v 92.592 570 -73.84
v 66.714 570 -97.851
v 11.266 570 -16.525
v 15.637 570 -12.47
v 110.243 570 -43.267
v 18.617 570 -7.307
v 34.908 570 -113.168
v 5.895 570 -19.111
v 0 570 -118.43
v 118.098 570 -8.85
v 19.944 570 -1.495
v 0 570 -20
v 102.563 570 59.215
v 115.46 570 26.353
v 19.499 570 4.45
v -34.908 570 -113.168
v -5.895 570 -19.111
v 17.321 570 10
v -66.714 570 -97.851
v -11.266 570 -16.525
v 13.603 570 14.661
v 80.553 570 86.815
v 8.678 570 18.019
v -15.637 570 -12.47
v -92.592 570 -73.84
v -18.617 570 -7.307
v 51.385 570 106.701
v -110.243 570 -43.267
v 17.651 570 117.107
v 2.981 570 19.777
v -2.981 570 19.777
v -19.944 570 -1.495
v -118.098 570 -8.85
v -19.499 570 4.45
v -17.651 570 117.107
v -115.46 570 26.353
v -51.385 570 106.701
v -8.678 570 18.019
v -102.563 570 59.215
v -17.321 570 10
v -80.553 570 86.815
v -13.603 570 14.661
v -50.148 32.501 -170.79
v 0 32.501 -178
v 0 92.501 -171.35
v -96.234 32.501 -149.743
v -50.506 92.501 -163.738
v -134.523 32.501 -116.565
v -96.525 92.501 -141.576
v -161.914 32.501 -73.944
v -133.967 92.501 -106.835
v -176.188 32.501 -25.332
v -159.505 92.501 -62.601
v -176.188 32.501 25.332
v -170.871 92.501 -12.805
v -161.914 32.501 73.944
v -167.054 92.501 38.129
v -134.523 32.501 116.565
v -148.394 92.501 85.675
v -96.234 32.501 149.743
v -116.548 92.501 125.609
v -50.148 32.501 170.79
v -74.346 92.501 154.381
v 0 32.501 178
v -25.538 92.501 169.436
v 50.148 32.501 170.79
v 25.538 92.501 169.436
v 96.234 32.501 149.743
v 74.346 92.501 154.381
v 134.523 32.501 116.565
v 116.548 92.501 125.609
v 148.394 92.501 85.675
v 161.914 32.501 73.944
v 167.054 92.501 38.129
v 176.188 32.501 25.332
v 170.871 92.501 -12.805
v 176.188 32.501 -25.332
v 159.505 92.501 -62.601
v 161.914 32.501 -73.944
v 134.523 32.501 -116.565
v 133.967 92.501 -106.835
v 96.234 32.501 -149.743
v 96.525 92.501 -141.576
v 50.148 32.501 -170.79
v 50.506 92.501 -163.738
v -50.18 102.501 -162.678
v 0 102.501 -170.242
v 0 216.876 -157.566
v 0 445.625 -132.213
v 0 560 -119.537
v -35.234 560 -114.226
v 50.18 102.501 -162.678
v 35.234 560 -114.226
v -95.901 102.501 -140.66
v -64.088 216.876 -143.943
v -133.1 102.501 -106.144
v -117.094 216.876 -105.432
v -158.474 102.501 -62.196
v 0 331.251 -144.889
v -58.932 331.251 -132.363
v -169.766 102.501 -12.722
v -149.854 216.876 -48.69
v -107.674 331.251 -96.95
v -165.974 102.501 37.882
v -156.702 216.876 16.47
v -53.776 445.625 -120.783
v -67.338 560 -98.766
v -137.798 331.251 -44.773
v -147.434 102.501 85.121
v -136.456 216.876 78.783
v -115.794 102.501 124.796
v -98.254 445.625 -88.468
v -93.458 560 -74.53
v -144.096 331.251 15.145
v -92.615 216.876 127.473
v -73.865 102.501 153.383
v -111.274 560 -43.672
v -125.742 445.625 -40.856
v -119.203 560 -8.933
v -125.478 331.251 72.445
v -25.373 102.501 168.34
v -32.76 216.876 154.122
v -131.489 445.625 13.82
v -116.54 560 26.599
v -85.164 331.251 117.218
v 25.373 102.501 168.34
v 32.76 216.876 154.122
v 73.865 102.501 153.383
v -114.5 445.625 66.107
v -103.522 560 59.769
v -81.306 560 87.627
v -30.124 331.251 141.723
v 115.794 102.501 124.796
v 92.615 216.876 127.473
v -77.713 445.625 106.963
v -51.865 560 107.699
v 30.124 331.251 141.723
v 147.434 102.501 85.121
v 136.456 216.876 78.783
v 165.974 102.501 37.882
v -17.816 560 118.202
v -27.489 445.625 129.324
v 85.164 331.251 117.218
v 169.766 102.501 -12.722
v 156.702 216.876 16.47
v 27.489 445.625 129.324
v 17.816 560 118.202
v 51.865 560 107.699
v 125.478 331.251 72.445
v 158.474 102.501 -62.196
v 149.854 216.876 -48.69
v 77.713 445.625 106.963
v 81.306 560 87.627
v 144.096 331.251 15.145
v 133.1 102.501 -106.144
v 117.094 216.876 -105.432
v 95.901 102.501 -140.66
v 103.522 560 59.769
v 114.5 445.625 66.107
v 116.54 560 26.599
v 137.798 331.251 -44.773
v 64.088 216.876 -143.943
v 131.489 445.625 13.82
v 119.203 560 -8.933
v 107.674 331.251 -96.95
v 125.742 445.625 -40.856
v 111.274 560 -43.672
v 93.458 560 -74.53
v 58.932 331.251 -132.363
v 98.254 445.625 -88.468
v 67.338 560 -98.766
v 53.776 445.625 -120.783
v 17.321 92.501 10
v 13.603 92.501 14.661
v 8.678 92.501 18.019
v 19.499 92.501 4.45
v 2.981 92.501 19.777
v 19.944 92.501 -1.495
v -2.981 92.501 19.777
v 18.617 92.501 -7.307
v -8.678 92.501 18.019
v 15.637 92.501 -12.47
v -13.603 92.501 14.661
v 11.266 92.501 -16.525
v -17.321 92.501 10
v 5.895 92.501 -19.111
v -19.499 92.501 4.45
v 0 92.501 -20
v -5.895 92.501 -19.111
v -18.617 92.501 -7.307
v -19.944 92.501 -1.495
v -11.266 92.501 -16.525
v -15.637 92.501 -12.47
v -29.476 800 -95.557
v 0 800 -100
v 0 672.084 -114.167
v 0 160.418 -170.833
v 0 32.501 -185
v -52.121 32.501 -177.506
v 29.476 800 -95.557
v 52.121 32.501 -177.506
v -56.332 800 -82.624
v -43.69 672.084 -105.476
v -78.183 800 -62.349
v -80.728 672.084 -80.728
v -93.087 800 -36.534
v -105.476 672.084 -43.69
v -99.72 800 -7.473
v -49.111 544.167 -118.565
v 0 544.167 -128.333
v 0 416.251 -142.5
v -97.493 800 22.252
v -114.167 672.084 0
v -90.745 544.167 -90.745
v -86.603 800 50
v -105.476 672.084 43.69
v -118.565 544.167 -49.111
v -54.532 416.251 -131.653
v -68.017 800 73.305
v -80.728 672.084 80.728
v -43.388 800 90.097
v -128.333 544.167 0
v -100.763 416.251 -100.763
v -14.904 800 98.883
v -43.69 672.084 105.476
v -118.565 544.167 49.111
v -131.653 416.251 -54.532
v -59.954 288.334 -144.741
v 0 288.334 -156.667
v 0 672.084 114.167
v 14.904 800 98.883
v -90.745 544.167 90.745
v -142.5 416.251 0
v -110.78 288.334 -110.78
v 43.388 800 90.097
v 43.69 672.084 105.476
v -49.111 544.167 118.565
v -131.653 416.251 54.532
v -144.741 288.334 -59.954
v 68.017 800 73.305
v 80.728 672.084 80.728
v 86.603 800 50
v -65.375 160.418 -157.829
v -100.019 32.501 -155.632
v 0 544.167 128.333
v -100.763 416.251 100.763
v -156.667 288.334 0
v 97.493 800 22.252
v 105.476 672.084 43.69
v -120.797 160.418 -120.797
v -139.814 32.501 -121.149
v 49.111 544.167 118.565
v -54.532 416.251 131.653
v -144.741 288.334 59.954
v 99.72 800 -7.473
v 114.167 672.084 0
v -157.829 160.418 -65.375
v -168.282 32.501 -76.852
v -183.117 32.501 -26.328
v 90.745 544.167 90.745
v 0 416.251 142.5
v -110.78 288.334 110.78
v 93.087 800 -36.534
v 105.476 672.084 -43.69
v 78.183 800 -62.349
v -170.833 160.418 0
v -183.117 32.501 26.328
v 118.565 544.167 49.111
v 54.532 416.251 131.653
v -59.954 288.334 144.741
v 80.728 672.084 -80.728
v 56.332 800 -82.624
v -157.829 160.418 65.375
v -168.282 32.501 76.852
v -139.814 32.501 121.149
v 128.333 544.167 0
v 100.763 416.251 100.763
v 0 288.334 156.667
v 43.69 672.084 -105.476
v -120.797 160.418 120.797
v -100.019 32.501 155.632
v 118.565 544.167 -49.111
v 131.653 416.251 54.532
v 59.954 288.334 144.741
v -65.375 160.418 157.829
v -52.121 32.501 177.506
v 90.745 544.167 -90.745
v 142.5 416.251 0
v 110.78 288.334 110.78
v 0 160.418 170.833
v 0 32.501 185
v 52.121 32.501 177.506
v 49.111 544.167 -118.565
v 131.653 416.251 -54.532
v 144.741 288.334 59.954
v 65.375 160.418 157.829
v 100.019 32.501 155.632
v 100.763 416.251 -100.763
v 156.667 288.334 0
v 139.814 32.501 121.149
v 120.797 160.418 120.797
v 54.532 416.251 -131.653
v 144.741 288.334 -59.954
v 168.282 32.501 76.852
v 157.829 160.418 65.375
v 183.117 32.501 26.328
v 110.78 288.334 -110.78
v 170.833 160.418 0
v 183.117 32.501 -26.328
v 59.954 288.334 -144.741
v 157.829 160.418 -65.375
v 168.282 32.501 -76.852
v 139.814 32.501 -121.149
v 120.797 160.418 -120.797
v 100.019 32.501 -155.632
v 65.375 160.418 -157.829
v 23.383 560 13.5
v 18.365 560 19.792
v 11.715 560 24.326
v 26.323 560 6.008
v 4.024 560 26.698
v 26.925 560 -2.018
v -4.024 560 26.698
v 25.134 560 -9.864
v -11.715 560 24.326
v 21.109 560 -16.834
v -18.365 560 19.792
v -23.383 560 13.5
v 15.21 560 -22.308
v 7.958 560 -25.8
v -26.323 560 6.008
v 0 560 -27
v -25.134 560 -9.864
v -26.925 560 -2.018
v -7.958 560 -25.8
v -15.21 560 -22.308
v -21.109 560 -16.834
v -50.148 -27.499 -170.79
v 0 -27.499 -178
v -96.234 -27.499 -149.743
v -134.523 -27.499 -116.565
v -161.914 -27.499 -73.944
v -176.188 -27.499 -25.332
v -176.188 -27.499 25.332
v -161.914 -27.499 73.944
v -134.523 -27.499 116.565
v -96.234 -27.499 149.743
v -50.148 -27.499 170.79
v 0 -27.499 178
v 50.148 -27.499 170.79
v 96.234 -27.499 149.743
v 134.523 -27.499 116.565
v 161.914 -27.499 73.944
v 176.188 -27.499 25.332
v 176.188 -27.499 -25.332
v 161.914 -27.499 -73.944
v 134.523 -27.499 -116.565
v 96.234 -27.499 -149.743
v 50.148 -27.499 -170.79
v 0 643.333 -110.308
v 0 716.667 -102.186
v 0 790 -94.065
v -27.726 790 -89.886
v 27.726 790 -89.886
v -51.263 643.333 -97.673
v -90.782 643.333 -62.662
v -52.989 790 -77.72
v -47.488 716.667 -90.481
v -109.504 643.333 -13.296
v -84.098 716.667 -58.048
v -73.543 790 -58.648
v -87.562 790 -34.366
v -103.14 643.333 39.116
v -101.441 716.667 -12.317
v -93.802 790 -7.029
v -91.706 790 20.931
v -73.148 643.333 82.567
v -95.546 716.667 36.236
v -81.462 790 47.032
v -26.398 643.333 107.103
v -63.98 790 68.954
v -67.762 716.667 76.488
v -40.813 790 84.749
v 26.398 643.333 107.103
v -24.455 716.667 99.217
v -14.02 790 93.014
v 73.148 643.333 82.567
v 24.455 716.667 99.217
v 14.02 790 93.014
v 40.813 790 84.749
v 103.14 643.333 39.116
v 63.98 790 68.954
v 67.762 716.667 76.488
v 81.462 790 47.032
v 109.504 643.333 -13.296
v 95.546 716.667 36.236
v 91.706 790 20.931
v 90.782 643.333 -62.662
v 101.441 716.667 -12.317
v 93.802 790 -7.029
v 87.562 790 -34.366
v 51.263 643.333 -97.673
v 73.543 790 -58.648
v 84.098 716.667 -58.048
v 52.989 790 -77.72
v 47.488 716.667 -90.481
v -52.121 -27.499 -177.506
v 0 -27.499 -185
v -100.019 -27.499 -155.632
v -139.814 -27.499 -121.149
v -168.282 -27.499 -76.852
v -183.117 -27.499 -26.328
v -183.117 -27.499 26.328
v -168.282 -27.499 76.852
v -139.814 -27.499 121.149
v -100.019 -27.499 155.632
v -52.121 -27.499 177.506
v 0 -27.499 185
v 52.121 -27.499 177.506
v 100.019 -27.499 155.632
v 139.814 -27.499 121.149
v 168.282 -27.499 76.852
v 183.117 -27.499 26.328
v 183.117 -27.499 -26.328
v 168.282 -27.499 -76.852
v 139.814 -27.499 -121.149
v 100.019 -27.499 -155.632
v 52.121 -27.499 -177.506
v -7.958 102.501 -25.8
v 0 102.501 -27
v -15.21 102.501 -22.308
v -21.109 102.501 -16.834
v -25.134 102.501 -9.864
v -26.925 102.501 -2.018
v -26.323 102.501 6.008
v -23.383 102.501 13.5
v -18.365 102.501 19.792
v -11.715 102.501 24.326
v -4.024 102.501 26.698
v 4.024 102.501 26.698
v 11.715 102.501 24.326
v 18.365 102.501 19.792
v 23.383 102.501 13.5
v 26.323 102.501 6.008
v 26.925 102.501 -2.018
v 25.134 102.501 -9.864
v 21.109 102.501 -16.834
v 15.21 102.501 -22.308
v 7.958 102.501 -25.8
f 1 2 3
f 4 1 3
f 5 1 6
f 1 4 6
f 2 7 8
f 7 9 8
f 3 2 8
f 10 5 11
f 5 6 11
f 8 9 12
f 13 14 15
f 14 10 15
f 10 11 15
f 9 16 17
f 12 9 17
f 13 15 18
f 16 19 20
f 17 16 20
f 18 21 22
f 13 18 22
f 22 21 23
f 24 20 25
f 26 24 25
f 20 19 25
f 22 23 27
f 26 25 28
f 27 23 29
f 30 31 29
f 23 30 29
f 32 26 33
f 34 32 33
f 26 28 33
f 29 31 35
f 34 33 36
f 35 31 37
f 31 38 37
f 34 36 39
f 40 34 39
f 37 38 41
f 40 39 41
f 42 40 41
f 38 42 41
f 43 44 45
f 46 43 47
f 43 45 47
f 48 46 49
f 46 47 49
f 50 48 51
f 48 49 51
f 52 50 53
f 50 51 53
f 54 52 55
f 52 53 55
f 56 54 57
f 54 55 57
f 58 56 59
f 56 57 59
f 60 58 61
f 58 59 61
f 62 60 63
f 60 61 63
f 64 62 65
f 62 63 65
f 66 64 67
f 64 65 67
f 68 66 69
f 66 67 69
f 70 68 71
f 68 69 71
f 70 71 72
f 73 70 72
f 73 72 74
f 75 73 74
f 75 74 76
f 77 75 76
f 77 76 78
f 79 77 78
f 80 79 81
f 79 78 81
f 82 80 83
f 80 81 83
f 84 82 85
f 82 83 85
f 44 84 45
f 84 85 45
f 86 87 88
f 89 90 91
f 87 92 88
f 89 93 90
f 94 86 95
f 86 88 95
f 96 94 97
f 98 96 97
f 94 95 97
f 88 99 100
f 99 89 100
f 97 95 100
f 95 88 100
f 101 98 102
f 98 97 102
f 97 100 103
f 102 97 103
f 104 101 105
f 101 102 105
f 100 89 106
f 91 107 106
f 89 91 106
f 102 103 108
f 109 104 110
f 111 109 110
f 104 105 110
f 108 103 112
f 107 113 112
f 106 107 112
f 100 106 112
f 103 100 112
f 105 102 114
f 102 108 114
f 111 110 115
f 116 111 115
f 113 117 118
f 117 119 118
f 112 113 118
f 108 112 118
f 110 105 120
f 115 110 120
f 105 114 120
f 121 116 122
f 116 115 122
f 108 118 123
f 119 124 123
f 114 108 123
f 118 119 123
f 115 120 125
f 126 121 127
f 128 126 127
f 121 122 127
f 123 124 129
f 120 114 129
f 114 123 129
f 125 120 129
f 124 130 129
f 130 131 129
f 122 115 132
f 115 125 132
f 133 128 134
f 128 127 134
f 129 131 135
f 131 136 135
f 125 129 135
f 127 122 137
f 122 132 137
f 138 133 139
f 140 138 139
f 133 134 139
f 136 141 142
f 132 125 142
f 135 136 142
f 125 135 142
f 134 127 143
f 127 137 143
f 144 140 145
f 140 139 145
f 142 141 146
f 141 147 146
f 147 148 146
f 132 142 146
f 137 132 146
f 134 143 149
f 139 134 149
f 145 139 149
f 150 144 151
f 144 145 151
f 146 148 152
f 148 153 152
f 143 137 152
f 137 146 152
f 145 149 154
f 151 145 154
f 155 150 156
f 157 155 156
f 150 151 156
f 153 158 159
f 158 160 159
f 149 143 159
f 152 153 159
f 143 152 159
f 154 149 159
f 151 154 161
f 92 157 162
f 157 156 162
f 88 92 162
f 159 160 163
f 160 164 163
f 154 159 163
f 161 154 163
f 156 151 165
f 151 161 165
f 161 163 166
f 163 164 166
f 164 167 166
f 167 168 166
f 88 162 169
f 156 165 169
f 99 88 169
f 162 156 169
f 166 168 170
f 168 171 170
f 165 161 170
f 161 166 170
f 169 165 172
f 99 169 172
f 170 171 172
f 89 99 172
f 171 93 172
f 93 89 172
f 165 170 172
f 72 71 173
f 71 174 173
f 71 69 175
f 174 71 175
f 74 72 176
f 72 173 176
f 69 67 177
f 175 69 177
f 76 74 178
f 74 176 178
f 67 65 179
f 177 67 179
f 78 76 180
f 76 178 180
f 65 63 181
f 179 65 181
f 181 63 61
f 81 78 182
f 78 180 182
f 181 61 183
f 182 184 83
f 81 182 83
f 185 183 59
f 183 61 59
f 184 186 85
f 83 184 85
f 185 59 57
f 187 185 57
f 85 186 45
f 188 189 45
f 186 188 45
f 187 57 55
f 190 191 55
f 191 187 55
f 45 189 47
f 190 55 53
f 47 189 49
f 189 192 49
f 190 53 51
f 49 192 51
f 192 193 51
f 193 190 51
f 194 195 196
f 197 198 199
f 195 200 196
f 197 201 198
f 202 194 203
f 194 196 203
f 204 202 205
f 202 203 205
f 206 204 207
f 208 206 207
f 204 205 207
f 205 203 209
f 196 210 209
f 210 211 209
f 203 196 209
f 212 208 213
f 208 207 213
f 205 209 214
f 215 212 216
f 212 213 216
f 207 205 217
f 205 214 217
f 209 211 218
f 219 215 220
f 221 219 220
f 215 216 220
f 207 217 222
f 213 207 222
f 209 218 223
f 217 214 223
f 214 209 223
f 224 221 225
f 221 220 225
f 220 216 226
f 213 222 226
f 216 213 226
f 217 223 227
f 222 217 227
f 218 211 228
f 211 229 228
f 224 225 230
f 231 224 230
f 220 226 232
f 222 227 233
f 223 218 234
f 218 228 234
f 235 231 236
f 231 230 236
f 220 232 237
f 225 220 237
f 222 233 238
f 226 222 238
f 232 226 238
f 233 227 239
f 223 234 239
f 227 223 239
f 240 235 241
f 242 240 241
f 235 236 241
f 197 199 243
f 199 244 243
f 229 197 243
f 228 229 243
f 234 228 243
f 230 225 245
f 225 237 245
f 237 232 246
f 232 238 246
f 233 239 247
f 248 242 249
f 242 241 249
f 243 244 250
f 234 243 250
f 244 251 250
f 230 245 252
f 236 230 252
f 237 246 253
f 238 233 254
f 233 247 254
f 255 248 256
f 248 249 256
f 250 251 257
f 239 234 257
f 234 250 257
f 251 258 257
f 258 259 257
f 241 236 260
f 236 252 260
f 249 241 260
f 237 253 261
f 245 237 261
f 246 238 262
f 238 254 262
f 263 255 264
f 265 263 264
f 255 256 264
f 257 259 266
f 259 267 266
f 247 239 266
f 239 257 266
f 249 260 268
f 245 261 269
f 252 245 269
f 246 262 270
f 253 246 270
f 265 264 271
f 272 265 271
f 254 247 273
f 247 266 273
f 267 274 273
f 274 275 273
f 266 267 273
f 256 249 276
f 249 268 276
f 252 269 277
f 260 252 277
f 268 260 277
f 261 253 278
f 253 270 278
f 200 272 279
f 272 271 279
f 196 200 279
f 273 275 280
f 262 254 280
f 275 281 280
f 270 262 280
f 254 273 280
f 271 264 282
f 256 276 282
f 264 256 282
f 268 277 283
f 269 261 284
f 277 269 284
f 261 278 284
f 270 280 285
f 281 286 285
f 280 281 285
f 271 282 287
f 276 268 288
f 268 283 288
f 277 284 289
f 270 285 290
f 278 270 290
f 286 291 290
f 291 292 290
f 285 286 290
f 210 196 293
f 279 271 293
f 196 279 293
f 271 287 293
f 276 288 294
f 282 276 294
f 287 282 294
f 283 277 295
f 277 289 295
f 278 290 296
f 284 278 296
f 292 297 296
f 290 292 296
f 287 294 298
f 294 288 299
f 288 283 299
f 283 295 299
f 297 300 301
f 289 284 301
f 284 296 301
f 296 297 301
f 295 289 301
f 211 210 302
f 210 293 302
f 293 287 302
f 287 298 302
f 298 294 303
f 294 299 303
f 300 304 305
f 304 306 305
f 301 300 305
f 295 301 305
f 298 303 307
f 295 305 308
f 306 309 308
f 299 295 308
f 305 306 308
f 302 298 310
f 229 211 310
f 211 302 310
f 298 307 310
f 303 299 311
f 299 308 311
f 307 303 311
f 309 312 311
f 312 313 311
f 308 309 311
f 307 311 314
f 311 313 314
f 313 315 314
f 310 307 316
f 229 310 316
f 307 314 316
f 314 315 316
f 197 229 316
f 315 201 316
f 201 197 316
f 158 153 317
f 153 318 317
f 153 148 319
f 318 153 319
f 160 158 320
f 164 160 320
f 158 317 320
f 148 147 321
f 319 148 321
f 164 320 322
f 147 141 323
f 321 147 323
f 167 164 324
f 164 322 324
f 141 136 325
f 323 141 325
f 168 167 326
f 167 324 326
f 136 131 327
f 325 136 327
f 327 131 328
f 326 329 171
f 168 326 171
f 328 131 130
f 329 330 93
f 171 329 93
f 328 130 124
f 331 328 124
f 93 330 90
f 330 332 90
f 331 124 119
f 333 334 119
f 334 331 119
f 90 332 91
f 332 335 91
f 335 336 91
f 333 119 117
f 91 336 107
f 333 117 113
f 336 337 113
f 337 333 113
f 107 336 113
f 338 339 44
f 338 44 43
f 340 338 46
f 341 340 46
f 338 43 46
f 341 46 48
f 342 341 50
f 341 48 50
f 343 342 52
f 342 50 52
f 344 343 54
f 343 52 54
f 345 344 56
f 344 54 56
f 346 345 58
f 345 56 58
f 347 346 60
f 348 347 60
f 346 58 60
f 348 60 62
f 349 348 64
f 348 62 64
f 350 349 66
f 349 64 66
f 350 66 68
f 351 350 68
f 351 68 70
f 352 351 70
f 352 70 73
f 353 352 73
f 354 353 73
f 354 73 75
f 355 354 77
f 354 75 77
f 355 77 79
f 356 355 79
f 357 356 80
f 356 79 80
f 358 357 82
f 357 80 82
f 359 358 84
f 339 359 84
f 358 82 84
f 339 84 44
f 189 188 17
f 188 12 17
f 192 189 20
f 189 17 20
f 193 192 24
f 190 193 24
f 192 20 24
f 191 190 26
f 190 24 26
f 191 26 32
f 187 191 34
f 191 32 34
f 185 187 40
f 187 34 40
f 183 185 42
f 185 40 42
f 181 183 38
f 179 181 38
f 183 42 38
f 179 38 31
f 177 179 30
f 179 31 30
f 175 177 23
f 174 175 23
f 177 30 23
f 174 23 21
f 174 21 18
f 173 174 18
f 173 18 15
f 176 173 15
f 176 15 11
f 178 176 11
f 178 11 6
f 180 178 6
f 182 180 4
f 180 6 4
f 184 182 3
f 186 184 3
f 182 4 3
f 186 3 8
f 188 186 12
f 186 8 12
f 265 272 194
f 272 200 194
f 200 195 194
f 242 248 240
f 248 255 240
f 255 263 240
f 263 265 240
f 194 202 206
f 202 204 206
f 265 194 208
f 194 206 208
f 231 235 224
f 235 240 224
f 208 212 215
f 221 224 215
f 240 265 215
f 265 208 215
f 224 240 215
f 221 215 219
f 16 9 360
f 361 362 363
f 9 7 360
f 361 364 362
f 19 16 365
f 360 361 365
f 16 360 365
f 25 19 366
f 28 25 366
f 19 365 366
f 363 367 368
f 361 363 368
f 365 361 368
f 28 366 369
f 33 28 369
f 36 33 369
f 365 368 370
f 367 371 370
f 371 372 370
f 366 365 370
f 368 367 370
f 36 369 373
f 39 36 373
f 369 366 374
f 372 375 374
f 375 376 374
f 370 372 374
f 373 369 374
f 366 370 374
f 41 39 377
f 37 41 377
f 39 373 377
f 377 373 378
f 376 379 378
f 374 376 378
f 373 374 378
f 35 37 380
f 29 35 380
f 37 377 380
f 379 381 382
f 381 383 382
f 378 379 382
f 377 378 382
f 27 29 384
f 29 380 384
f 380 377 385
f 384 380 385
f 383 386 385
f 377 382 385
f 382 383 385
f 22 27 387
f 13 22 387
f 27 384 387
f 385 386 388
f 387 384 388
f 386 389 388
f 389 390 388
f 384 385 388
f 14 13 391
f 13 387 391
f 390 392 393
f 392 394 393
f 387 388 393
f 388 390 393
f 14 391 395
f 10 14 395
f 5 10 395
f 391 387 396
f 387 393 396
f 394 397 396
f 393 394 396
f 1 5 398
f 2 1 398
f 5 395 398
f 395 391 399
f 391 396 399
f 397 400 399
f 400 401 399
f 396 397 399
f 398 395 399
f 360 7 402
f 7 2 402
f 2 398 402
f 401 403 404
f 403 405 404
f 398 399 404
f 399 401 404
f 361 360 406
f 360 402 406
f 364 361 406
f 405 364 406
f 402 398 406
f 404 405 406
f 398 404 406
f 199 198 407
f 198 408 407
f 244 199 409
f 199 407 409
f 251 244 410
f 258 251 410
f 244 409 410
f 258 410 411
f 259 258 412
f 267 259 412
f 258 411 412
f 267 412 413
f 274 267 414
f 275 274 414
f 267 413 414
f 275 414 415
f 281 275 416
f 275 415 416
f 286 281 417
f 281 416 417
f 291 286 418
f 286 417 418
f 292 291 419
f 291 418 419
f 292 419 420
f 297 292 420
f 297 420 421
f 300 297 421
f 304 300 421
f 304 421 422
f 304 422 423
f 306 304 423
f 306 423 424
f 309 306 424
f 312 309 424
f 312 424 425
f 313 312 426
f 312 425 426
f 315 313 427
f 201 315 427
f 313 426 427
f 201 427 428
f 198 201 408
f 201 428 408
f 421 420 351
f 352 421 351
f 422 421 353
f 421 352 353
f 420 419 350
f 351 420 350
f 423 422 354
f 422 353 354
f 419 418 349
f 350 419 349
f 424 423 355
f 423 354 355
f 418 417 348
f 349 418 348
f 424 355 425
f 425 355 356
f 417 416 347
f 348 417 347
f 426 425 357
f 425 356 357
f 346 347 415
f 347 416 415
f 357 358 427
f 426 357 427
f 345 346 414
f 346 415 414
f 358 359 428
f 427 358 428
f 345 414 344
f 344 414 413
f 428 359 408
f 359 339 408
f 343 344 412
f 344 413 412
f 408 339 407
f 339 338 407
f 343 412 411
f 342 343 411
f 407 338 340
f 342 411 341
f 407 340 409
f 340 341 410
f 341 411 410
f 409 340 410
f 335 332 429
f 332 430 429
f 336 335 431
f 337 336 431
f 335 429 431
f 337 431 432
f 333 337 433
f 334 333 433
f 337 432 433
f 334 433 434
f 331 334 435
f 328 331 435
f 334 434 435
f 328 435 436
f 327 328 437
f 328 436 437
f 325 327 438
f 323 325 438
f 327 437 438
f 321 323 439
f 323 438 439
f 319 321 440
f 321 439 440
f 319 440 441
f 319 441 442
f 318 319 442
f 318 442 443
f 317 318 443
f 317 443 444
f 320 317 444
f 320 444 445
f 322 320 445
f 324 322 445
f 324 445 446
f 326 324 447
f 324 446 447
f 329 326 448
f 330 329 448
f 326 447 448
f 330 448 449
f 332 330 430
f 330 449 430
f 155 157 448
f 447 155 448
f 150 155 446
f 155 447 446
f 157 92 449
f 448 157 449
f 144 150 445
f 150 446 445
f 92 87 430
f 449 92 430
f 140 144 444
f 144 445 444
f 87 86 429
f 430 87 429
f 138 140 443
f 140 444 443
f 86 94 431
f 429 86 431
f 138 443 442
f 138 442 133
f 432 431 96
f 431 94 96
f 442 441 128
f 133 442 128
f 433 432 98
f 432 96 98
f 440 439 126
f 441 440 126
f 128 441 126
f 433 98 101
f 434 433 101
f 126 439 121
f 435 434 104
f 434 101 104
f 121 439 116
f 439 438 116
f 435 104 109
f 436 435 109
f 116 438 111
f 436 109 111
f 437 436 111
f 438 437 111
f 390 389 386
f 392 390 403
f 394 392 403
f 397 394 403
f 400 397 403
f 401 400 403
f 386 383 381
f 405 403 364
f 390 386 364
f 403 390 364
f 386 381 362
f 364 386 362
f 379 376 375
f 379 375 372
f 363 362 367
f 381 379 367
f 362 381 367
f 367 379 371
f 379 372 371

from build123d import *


with BuildPart() as part:
    # Sketch1 → Revolve1 (revolve)
    with BuildSketch(Plane.XY, mode=Mode.PRIVATE) as revolve1_sk:
        Polygon((-94.064695228, 790), (0, 790), (0, 800), (-100, 800), (-185, 32.501032947), (-185, -27.498967053), (-178, -27.498967053), (-178, 32.501032947), (-171.350171875, 92.501032947), (-20, 92.501032947), (-20, 570), (-118.429548867, 570), align=None)
        Polygon((-119.537042214, 560), (-27, 560), (-27, 102.501032947), (-170.241867187, 102.501032947), align=None, mode=Mode.SUBTRACT)
    revolve(revolve1_sk.sketch.rotate(Axis((0, -27.498967053, 0), (0, 1, 0)), 270), axis=Axis((0, -27.498967053, 0), (0, 1, 0)))


solid = part.part
